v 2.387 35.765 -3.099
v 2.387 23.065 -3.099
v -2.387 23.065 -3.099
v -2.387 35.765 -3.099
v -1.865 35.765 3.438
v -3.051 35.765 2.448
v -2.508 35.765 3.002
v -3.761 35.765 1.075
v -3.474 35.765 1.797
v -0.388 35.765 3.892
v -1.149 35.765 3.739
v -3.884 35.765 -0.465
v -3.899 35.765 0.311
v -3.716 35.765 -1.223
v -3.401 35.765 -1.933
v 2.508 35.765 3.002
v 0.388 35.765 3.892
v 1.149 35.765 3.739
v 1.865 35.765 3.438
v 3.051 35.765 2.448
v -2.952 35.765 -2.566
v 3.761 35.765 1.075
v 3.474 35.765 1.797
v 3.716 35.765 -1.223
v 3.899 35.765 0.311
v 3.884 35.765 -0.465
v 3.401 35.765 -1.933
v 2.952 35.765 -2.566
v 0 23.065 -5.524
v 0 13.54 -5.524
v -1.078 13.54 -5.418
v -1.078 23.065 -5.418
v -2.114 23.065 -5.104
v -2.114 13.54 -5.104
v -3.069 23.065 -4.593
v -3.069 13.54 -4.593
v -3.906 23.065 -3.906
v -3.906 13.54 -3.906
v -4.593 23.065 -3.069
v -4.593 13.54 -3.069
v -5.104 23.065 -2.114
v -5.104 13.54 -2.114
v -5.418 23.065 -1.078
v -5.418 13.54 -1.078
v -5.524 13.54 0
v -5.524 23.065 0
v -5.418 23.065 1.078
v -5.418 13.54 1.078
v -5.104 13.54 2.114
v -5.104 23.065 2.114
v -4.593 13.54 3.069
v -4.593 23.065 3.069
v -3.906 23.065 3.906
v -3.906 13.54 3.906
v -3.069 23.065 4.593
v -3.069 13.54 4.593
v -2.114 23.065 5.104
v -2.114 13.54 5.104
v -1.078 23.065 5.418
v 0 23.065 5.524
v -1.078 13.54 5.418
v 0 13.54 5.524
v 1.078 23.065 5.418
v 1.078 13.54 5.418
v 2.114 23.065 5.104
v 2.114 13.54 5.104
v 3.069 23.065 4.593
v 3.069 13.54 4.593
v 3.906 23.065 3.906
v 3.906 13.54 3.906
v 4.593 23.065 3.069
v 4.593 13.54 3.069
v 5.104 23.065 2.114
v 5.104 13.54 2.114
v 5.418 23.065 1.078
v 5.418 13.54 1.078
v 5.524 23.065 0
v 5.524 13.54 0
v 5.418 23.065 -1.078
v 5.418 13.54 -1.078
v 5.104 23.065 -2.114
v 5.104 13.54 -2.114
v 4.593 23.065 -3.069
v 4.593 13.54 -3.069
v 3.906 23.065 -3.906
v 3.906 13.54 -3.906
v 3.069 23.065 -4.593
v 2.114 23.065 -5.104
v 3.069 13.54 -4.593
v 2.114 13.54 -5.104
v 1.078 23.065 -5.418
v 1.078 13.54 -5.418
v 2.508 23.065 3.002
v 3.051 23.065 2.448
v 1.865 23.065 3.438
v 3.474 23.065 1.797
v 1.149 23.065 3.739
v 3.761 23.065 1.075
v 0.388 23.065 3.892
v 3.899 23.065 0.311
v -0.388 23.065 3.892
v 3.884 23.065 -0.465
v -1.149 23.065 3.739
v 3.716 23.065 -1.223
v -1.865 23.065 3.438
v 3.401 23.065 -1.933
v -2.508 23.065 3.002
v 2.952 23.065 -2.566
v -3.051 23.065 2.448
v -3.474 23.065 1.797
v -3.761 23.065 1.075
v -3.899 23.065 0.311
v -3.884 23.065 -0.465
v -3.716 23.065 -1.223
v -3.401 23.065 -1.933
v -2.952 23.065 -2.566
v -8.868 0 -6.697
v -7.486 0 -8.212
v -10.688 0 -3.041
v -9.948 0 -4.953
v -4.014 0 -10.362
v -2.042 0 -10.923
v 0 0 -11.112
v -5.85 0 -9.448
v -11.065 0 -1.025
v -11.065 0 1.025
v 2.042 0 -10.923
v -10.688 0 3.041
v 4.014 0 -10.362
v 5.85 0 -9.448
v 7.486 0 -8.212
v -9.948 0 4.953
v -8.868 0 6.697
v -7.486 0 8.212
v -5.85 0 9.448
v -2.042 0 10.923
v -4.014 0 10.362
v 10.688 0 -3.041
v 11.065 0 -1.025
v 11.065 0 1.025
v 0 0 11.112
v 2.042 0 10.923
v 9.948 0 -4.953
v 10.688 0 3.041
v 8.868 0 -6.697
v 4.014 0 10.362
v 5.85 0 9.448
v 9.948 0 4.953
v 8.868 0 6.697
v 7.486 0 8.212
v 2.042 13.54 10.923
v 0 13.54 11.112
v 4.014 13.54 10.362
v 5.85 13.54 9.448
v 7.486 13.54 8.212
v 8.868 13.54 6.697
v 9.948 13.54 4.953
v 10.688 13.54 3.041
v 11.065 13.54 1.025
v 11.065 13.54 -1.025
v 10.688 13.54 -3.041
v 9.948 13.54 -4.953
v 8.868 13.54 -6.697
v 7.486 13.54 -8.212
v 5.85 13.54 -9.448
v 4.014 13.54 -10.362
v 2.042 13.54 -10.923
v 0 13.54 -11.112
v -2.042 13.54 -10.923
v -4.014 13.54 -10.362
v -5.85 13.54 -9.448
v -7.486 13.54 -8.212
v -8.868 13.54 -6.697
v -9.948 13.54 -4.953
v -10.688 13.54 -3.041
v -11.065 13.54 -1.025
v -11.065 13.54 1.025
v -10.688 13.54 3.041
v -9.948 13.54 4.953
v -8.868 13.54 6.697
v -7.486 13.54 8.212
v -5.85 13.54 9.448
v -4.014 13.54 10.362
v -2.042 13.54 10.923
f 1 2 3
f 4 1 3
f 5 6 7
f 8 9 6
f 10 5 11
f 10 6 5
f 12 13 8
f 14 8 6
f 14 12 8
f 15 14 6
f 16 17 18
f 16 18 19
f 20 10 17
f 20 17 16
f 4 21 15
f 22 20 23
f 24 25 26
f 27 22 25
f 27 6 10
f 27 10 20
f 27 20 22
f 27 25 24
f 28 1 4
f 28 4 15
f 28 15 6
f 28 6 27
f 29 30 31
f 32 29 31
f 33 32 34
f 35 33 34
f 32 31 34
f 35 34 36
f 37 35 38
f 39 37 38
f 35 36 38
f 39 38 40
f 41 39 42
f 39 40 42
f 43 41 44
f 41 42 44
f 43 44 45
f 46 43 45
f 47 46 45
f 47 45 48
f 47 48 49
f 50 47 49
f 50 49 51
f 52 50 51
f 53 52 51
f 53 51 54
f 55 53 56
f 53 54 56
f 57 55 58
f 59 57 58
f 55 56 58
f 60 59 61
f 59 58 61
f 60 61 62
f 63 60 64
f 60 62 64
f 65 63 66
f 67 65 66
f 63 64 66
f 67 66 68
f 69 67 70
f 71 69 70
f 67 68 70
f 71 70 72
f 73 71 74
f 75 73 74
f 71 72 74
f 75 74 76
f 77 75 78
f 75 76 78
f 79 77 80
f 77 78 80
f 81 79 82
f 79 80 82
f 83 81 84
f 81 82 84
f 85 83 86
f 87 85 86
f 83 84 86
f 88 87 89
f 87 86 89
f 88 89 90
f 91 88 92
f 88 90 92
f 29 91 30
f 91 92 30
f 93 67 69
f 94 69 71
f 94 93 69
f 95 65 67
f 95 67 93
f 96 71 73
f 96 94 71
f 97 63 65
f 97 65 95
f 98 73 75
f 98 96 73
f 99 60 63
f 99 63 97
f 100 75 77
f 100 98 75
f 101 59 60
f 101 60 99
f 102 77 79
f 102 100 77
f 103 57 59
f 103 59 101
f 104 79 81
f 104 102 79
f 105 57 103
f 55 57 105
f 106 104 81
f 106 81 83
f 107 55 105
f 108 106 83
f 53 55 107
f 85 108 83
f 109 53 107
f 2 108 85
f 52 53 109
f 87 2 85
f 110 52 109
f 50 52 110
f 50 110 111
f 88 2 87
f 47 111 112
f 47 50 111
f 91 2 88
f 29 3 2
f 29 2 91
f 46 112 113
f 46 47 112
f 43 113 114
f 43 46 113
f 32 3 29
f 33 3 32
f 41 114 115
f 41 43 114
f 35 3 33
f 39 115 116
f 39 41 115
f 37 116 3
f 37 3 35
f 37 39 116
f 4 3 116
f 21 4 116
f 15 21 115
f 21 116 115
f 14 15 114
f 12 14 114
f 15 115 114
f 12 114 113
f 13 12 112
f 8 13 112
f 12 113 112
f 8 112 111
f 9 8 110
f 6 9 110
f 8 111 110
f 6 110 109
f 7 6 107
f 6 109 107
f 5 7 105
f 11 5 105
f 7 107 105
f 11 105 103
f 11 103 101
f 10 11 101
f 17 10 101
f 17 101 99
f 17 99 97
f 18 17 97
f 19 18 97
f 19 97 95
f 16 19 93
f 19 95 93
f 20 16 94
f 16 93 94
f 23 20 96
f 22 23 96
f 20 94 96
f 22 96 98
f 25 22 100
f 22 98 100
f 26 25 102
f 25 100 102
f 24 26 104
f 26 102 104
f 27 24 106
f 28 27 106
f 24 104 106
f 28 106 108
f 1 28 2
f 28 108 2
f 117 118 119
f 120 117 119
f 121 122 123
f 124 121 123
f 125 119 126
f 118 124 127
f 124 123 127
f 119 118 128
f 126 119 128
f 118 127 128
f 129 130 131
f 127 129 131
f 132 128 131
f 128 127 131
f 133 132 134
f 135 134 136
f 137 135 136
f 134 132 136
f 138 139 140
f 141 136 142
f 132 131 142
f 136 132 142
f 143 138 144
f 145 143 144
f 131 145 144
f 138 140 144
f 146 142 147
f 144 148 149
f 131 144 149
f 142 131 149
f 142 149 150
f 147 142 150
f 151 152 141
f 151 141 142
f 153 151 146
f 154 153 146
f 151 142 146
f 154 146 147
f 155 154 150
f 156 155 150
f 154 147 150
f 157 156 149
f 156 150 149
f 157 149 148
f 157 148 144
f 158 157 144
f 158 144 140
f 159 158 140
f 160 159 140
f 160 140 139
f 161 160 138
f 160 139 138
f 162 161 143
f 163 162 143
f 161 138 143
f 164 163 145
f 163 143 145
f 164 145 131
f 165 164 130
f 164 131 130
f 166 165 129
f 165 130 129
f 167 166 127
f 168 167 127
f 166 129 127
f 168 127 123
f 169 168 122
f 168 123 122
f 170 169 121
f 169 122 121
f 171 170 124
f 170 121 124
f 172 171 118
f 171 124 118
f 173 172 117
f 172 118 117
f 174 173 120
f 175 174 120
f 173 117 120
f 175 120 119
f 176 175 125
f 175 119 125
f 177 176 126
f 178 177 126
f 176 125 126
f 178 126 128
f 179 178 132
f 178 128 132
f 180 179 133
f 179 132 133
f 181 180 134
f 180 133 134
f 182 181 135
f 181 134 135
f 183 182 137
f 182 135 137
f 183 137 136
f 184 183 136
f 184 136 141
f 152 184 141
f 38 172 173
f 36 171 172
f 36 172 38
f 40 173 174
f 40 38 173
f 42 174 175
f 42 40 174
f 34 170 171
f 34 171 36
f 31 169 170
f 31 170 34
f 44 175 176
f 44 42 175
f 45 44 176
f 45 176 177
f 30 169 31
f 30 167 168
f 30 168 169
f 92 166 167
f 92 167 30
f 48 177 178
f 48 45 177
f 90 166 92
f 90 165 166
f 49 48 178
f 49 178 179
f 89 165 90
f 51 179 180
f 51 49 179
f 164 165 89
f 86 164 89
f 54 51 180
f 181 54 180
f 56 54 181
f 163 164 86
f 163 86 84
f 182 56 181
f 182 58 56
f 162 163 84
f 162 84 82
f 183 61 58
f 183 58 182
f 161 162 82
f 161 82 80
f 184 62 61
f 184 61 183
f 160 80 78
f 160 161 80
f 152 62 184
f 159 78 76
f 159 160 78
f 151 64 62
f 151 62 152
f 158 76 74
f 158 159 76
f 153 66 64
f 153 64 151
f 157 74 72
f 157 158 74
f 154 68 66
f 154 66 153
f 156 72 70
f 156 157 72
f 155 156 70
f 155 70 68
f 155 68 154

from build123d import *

# Parameters (mm, degrees)
SKETCH1_R           = 11.1125
BOSS_EXTRUDE1_DEPTH = 13.54
SKETCH2_R           = 5.5245
BOSS_EXTRUDE2_DEPTH = 9.525
BOSS_EXTRUDE3_DEPTH = 12.7


with BuildPart() as part:
    # Sketch1 → Boss-Extrude1 (new body)
    with BuildSketch(Plane(origin=(0, 0, 0), x_dir=(1, 0, 0), z_dir=(0, 1, 0))):
        with Locations(Location((0, 0, 0), (0, 0, 270))):
            Circle(SKETCH1_R)
    extrude(amount=BOSS_EXTRUDE1_DEPTH)

    # Sketch2 → Boss-Extrude2 (add)
    with BuildSketch(Plane(origin=(0, 13.54, 0), x_dir=(1, 0, 0), z_dir=(0, 1, 0))):
        with Locations(Location((0, 0, 0), (0, 0, 90))):
            Circle(SKETCH2_R)
    extrude(amount=BOSS_EXTRUDE2_DEPTH)

    # Sketch3 → Boss-Extrude3 (add)
    with BuildSketch(Plane(origin=(0, 23.065, 0), x_dir=(1, 0, 0), z_dir=(0, 1, 0))):
        with BuildLine():
            Line((2.387059513, 3.0988), (-2.387059513, 3.0988))
            ThreePointArc((-2.387059513, 3.0988), (0, -3.9116), (2.387059513, 3.0988))
        make_face()
    extrude(amount=BOSS_EXTRUDE3_DEPTH)


solid = part.part
